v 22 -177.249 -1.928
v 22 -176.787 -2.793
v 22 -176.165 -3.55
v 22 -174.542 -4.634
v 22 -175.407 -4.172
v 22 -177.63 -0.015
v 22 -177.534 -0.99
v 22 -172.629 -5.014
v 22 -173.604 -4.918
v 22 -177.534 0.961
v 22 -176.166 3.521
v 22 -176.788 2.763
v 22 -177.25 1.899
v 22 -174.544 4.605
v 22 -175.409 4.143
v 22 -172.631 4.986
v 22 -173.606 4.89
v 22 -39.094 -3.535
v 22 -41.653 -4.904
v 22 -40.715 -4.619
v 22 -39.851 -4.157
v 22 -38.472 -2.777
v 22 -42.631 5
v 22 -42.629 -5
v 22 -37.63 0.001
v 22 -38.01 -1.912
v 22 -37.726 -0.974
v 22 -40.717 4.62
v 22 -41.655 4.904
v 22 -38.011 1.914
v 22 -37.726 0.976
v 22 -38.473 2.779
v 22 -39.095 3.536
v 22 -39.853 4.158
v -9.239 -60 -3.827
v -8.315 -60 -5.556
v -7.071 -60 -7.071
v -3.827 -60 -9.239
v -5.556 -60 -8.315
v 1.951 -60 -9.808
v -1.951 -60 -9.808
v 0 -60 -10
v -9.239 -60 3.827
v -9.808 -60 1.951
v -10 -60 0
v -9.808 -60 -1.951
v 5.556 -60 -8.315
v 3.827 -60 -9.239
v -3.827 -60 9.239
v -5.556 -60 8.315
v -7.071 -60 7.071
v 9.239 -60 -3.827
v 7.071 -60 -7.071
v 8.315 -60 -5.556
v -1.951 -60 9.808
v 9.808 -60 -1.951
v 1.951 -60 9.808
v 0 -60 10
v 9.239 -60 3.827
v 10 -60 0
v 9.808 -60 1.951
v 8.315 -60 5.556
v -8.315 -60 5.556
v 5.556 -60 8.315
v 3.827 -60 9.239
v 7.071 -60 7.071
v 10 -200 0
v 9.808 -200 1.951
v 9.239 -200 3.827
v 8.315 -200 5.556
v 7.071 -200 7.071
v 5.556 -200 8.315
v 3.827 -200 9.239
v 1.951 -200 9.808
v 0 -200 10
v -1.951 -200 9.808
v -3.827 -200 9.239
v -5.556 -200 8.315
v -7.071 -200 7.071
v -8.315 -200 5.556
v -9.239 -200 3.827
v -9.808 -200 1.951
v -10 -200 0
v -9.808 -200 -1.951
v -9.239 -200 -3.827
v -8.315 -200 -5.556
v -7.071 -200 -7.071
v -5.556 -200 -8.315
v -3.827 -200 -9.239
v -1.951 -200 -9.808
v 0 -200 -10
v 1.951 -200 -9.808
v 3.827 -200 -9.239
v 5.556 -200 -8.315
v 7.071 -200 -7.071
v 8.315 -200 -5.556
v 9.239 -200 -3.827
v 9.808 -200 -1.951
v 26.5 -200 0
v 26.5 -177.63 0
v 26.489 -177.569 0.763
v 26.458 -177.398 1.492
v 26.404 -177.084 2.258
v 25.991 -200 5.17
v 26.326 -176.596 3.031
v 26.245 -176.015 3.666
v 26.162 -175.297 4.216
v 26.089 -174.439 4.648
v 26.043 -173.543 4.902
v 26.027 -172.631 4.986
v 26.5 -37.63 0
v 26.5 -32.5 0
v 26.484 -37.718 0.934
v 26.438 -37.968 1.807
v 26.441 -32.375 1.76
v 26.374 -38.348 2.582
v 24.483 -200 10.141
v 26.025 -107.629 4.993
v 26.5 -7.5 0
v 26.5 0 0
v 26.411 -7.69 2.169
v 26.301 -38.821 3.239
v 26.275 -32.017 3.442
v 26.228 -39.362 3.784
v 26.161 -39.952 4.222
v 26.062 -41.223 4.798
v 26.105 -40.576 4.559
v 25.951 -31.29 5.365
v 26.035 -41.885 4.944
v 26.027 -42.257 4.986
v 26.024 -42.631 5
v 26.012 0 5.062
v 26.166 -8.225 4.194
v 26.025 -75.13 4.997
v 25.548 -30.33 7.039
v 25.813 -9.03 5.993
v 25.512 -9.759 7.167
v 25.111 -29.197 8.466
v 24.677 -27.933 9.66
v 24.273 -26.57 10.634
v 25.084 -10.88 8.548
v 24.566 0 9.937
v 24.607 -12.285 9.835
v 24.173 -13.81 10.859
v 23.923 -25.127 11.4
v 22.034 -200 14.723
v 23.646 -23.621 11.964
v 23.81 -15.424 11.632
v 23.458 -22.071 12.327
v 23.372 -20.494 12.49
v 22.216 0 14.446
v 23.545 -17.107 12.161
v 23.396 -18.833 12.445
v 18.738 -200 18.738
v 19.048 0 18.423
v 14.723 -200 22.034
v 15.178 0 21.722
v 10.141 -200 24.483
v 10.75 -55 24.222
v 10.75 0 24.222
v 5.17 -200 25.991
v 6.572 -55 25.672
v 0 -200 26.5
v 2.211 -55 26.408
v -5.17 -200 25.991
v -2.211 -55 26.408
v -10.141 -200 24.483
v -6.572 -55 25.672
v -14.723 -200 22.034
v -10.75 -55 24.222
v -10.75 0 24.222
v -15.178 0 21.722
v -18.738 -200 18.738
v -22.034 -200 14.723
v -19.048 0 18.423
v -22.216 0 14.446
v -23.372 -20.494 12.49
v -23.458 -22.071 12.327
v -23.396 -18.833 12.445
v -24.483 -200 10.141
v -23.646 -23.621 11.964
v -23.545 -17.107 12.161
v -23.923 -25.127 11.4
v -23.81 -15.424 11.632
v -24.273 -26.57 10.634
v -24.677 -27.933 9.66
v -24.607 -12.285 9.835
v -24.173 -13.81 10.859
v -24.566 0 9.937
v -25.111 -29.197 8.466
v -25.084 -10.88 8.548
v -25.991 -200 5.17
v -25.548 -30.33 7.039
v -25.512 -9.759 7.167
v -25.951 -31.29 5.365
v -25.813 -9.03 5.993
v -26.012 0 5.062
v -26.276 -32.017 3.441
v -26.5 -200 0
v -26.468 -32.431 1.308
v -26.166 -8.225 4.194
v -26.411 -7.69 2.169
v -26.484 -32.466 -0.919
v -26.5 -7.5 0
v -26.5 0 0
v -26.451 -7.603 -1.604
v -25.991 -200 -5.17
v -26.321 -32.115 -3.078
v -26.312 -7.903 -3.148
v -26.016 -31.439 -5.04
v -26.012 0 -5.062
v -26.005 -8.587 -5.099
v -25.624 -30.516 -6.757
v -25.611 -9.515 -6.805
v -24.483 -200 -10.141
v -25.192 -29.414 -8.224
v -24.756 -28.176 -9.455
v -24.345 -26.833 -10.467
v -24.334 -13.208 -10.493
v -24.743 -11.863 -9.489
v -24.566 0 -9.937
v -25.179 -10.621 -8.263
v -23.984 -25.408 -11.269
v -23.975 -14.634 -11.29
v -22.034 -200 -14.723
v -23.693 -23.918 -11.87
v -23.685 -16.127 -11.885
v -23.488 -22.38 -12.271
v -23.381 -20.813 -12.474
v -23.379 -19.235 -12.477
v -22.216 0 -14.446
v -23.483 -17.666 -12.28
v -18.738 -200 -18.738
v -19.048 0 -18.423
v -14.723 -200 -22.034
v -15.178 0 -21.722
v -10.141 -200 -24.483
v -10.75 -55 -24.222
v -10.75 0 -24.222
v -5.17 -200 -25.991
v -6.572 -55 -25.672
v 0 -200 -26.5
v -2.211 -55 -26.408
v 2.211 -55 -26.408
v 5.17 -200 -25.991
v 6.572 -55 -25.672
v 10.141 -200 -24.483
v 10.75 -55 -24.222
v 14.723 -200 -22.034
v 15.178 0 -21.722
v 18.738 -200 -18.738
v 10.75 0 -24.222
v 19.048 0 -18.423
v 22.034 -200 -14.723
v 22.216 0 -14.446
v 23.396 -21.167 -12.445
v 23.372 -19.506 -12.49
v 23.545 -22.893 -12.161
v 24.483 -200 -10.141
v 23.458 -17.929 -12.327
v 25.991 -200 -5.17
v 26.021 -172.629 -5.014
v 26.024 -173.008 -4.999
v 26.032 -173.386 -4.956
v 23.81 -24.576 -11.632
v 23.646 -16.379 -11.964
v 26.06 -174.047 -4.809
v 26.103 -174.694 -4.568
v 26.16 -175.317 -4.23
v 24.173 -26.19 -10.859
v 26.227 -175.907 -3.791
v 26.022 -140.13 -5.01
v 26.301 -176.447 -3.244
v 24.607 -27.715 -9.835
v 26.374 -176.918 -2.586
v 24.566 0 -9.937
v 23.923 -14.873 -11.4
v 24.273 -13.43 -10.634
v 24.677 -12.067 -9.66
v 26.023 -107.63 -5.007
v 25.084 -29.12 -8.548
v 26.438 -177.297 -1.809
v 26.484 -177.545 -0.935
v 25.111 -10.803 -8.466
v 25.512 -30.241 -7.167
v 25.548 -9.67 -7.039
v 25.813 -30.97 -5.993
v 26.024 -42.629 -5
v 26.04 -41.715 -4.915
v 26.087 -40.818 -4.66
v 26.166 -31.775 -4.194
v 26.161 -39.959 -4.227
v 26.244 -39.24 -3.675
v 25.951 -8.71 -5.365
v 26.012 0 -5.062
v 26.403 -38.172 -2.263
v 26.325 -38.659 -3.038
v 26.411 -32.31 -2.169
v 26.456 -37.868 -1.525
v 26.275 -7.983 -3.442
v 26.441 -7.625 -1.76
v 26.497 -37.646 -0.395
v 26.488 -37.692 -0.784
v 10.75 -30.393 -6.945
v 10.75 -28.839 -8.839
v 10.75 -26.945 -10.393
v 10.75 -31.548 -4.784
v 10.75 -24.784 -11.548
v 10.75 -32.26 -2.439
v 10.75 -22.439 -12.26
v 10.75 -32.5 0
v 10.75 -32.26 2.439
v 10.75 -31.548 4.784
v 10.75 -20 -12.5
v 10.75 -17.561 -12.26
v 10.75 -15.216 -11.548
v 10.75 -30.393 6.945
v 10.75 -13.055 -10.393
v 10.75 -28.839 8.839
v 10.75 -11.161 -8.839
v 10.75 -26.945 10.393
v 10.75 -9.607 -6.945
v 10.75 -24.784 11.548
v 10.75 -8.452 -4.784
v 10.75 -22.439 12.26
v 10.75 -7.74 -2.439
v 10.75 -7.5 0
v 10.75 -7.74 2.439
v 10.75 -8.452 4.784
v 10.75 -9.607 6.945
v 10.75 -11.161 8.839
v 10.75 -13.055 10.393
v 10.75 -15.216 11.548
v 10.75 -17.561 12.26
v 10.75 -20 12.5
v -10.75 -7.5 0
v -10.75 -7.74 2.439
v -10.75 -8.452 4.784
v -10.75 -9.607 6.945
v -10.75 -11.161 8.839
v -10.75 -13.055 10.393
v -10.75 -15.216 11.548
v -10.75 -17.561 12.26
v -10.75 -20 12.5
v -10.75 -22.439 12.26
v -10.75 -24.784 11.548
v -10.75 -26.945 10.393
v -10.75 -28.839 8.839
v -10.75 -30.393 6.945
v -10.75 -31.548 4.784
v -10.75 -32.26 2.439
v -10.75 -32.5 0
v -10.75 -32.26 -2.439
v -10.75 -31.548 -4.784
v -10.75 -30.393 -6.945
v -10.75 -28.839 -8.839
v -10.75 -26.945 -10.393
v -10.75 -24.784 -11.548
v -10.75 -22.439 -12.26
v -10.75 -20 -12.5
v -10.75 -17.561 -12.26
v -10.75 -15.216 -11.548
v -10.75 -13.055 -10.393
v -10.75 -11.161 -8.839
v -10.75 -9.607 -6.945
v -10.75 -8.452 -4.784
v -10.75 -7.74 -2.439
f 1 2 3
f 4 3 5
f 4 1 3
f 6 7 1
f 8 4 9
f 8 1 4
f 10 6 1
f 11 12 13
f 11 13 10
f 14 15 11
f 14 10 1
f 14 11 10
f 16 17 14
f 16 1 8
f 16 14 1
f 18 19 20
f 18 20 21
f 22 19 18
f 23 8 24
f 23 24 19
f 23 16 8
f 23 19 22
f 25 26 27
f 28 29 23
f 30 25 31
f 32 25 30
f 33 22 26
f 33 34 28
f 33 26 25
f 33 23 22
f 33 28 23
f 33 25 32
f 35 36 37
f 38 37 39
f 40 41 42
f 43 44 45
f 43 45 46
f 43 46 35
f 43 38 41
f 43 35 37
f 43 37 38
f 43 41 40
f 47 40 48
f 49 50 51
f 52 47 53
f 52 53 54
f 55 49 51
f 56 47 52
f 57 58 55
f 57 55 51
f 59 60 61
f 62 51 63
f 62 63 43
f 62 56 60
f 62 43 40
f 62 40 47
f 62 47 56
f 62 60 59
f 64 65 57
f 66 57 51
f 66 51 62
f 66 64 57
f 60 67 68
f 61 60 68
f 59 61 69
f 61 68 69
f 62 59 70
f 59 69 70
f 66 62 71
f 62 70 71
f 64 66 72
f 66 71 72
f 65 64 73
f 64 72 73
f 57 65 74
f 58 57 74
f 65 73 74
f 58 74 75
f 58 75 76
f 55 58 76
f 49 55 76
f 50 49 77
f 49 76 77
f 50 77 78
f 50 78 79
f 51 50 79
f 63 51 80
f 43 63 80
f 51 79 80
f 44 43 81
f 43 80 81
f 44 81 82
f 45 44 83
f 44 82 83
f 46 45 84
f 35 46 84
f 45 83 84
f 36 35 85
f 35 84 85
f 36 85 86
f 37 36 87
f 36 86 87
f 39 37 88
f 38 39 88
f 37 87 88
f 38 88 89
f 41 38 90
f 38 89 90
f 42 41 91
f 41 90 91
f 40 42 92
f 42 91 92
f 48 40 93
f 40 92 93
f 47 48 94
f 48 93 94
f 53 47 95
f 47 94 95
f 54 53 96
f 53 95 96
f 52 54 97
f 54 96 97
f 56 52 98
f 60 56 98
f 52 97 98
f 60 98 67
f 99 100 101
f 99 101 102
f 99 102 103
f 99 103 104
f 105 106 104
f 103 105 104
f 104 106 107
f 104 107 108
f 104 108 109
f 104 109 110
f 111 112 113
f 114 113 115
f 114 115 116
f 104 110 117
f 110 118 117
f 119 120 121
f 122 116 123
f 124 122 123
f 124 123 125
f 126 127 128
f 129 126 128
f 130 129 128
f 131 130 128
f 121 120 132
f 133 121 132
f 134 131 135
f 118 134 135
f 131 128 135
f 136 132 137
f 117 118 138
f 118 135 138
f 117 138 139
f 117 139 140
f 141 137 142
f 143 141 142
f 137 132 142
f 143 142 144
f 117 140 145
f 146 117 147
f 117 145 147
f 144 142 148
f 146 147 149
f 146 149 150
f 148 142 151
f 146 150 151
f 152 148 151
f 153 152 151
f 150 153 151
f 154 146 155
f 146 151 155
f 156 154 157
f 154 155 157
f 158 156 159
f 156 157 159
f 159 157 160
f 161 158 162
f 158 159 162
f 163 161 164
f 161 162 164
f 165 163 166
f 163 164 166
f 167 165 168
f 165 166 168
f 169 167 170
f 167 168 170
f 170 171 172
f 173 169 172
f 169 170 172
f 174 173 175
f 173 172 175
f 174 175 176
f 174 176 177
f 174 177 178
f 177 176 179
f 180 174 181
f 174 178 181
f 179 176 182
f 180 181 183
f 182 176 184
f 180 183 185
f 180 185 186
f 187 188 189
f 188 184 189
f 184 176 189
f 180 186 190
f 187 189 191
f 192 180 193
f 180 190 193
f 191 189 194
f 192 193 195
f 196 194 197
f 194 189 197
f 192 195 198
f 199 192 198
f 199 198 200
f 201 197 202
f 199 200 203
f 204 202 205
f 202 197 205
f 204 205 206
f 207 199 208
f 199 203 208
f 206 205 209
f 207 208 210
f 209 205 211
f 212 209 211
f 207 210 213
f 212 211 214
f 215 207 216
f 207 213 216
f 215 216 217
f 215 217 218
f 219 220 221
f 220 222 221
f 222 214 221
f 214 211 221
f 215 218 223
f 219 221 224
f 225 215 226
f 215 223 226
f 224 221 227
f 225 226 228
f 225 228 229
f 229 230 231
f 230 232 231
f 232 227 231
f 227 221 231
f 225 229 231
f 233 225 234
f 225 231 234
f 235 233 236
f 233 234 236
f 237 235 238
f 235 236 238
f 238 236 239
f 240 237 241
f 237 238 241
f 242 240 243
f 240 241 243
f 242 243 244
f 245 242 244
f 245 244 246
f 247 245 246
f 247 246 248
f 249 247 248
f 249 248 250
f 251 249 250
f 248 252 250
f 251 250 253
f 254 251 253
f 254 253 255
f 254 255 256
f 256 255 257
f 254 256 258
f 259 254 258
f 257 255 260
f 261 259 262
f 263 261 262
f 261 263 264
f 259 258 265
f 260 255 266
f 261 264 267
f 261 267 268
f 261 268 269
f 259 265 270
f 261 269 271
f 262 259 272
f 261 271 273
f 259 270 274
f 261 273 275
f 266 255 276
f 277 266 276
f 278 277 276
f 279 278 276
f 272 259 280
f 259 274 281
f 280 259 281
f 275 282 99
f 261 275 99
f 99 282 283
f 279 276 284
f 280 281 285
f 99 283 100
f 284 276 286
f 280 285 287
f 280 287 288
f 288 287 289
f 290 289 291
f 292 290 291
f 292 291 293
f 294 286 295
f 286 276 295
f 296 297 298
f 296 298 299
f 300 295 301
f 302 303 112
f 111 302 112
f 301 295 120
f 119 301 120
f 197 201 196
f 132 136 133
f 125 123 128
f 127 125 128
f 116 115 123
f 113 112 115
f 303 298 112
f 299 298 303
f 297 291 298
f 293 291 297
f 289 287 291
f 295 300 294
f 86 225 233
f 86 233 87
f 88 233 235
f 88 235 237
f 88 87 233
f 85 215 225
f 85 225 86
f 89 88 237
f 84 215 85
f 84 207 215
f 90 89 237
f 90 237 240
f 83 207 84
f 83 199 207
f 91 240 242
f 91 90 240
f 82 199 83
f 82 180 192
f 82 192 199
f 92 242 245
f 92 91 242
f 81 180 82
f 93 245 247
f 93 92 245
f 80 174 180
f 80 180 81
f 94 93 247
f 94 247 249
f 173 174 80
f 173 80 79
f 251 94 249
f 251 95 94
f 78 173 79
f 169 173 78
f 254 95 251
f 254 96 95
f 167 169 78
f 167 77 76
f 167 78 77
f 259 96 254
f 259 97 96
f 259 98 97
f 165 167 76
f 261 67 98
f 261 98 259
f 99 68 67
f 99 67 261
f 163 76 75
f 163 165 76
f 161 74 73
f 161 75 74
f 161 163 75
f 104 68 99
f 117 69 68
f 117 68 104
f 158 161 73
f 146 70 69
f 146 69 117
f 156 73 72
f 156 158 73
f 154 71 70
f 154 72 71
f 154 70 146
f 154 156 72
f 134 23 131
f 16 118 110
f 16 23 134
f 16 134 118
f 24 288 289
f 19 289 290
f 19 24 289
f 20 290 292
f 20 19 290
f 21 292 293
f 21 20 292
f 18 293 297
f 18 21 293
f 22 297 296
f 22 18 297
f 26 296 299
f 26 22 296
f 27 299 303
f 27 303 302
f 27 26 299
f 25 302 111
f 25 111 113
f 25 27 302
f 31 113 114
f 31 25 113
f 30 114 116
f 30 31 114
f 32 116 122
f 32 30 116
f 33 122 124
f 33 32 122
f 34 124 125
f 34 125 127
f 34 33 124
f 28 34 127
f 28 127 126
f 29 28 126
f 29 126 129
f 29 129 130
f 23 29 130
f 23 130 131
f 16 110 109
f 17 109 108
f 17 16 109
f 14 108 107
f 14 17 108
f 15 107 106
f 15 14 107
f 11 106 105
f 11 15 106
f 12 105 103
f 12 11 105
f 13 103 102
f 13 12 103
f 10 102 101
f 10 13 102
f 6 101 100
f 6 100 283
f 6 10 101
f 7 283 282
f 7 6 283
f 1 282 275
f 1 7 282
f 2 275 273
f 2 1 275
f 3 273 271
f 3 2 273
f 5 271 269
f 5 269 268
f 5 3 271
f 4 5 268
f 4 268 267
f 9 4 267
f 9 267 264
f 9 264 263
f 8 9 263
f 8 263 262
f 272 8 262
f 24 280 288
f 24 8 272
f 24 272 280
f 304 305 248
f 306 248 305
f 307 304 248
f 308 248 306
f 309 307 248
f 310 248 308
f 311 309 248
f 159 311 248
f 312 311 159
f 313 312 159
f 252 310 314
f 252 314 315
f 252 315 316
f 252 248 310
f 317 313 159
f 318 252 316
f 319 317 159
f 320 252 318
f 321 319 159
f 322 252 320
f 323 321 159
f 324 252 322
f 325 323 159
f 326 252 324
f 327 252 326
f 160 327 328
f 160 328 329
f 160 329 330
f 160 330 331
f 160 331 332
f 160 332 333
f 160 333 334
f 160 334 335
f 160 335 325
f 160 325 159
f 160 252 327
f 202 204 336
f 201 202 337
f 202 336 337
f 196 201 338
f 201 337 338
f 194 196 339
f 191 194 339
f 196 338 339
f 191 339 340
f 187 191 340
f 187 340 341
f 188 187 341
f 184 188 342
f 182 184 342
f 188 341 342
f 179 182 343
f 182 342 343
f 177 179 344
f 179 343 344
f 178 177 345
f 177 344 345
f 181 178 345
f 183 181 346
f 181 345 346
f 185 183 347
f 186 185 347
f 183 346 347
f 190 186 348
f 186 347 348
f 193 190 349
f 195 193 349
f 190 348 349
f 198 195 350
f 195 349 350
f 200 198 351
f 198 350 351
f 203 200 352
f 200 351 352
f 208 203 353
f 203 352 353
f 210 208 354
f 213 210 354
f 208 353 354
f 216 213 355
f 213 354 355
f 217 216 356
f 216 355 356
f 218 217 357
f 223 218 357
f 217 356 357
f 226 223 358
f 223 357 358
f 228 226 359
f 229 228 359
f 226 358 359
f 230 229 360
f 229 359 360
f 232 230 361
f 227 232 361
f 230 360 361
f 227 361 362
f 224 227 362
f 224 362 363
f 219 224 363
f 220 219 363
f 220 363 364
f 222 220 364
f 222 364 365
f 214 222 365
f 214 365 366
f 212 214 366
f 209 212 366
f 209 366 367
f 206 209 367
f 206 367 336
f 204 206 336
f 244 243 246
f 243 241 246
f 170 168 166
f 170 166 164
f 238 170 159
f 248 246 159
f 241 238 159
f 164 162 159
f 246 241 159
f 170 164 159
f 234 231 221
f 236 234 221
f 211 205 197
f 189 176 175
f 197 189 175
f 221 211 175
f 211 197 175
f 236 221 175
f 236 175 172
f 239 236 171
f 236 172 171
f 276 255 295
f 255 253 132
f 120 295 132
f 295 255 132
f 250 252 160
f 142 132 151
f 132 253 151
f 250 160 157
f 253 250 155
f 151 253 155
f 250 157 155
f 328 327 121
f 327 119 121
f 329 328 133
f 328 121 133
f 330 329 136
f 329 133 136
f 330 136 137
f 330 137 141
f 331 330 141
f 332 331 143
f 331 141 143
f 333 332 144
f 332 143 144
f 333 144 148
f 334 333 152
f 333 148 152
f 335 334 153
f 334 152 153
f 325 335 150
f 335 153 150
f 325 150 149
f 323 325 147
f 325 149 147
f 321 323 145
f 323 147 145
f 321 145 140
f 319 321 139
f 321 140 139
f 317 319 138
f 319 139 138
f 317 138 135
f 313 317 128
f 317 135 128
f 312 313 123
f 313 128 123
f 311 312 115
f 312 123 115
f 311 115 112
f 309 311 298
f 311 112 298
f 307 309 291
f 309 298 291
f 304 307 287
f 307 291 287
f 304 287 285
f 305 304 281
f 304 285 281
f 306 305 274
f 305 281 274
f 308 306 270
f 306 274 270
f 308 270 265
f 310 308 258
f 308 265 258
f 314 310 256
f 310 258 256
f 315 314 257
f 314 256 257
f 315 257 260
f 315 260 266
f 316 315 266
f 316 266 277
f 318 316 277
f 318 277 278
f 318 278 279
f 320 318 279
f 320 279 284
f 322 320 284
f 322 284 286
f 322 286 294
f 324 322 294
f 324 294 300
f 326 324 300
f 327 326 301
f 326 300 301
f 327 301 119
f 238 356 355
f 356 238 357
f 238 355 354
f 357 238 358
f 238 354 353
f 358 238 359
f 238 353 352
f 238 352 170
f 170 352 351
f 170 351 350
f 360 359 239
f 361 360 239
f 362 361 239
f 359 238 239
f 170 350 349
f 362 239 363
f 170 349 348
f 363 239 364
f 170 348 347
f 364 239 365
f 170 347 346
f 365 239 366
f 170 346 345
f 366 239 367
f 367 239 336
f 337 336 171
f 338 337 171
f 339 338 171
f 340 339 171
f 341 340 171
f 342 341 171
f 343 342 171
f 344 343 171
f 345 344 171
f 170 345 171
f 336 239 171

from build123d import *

# Parameters (mm, degrees)
F0_R      = 26.5
F1_DEPTH  = 200
F2_R      = 12.5
F3_DEPTH  = 30
F4_W      = 21.5
F4_H      = 60
F5_DEPTH  = 55
F8_DEPTH  = 10
F9_R      = 10
F10_DEPTH = 140


with BuildPart() as f1:
    # F0 (on Front) → F1 (new body)
    with BuildSketch(Plane.XZ):
        Circle(F0_R)
    extrude(amount=F1_DEPTH)

    # F2 (on Right) → F3 (cut, symmetric)
    with BuildSketch(Plane.YZ):
        with Locations((-20, 0)):
            Circle(F2_R)
    extrude(amount=F3_DEPTH, both=True, mode=Mode.SUBTRACT)

    # F4 (on Front) → F5 (cut)
    with BuildSketch(Plane.XZ):
        Rectangle(F4_W, F4_H)
    extrude(amount=F5_DEPTH, mode=Mode.SUBTRACT)

    # F7 (on offset) → F8 (cut)
    with BuildSketch(Plane.YZ.offset(22)):
        with BuildLine():
            Line((-42.6307463948, 4.9999999723), (-172.6307456746, 4.986315794))
            ThreePointArc((-172.6307456746, 4.986315794), (-177.630219249, -0.0147382518), (-172.6286375277, -5.0136839281))
            Line((-172.6286375277, -5.0136839281), (-42.6286382479, -4.9999997498))
            ThreePointArc((-42.6286382479, -4.9999997498), (-37.6302201914, 0.0010540735), (-42.6307463948, 4.9999999723))
        make_face()
    extrude(amount=F8_DEPTH, mode=Mode.SUBTRACT)

    # F9 (on face) → F10 (cut)
    with BuildSketch(Plane.XZ.offset(200)):
        Circle(F9_R)
    extrude(amount=-F10_DEPTH, mode=Mode.SUBTRACT)


solid = f1.part
